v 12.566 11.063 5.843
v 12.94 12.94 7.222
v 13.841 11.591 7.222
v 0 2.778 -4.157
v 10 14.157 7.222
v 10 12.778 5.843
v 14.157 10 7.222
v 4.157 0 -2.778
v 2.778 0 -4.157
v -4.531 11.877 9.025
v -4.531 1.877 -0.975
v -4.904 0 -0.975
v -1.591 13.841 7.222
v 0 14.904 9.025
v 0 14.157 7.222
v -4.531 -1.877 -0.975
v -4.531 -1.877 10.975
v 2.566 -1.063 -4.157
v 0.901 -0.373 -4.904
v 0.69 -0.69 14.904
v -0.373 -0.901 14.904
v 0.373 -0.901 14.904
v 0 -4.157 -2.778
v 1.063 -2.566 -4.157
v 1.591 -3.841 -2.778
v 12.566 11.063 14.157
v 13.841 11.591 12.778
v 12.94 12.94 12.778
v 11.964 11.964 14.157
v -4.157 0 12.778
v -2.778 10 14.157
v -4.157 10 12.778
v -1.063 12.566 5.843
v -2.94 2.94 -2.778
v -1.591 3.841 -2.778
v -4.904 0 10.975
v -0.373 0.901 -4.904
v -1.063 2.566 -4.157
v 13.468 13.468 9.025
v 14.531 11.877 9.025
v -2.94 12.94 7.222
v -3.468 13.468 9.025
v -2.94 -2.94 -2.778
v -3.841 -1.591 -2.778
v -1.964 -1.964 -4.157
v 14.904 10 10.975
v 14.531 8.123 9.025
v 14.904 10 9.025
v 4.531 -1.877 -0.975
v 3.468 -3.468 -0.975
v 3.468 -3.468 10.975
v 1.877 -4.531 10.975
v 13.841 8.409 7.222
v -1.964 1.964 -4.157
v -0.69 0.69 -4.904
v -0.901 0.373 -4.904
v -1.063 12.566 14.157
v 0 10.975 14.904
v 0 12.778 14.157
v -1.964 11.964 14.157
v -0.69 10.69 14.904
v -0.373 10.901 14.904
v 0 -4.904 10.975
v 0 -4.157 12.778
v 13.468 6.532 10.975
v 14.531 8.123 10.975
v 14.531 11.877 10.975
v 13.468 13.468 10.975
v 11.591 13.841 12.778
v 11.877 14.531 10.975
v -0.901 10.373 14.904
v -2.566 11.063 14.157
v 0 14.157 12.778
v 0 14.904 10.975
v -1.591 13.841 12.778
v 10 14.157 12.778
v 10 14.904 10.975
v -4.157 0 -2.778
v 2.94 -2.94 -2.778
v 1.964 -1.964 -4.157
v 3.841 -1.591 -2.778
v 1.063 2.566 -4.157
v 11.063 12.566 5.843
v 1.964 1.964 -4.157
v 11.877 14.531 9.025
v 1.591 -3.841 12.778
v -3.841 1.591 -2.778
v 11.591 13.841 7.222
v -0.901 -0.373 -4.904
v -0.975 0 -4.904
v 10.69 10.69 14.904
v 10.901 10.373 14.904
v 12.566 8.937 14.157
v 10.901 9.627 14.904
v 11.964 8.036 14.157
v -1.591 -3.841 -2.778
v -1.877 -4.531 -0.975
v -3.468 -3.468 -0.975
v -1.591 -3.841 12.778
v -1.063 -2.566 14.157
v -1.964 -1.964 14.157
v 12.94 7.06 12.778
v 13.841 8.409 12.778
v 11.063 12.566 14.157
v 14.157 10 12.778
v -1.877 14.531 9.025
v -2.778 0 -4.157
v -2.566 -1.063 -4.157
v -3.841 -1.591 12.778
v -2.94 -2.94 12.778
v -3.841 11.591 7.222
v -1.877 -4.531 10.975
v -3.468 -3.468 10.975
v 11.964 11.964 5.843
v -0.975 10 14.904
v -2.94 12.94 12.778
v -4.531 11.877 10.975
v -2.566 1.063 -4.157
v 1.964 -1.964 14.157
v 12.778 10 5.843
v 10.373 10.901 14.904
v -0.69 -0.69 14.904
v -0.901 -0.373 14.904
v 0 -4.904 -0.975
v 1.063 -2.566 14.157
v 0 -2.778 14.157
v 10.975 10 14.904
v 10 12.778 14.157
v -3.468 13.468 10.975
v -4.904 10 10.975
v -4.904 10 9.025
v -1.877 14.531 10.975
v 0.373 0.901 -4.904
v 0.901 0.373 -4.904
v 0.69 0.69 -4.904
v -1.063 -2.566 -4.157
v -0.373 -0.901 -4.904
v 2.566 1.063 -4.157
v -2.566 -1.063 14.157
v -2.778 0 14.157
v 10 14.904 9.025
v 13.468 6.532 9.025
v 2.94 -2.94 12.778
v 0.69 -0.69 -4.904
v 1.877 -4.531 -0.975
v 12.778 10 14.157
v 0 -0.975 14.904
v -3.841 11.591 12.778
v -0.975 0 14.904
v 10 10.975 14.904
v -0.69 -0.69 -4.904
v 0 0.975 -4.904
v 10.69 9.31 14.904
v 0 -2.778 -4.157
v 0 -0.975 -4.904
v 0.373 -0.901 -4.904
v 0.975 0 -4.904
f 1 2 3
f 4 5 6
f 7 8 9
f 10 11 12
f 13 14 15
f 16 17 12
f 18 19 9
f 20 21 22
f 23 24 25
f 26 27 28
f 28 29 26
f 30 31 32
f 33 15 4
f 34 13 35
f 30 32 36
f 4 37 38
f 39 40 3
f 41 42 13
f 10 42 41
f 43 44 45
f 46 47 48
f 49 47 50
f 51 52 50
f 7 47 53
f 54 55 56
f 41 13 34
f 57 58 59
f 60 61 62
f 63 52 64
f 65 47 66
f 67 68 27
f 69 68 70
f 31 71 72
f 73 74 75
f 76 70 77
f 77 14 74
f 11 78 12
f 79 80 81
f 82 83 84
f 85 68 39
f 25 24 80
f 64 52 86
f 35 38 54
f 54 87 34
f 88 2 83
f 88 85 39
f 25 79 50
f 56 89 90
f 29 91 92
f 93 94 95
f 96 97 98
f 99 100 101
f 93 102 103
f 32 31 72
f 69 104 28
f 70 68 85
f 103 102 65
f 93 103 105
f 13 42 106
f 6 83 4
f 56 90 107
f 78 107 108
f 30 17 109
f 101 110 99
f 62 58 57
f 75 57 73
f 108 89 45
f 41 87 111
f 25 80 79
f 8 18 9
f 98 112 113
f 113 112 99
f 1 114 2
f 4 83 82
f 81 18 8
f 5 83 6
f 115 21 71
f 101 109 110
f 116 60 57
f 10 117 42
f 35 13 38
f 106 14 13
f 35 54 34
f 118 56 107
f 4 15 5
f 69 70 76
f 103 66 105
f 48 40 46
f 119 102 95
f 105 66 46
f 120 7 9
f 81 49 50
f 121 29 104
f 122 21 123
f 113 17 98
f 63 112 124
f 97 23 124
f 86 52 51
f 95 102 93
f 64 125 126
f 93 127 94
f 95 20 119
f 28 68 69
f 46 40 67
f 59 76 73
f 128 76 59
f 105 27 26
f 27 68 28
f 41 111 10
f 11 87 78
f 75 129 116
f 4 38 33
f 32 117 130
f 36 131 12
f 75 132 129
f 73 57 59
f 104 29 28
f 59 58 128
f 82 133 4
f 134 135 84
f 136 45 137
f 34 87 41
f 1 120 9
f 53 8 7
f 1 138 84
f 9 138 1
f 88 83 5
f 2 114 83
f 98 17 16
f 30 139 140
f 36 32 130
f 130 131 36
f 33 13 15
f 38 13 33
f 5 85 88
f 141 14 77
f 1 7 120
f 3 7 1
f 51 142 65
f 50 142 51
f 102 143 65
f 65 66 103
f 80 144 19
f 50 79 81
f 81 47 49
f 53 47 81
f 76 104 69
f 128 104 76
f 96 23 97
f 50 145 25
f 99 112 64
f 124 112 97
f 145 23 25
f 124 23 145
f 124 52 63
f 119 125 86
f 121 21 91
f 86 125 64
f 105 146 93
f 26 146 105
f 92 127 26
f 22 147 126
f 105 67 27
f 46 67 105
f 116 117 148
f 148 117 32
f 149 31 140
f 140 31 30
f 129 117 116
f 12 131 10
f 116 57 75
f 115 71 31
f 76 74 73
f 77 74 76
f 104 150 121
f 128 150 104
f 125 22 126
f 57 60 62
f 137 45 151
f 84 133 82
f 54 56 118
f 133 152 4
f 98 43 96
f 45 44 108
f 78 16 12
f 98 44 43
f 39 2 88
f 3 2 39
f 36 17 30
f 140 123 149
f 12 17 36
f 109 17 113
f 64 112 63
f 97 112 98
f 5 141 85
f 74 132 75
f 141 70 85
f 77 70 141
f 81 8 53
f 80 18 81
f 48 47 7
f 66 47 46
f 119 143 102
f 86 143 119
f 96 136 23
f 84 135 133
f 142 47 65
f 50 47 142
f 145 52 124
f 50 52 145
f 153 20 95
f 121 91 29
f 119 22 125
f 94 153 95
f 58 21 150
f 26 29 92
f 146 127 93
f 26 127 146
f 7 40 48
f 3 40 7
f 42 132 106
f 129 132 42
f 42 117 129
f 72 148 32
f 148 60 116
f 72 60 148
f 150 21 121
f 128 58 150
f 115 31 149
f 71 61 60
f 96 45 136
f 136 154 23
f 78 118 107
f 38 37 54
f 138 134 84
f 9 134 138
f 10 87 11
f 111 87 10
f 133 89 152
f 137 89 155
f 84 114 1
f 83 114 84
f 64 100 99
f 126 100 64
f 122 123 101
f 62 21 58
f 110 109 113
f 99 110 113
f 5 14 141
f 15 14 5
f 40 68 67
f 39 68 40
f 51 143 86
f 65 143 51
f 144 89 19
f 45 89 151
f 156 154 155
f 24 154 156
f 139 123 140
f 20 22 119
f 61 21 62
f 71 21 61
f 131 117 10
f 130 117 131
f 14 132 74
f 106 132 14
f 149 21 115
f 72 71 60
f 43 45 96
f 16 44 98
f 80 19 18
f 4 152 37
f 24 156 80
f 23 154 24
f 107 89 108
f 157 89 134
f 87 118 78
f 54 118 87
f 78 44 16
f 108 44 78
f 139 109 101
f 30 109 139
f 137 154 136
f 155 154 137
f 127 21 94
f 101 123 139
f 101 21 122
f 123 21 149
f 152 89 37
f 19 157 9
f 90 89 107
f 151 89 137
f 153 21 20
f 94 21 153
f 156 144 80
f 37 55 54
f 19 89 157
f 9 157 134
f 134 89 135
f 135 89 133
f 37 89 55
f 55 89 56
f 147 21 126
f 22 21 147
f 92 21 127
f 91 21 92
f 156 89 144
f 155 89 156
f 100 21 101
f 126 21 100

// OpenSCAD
module s10(){sphere(5);};
module h10(){hull(){translate(v=[10,0,0]){s10();} s10();}}
module h11(){hull(){translate(v=[0,10,0]){h10();} s10();}}
module h12(){hull(){translate(v=[0,0,10]){h11();} s10();}}

h12();
